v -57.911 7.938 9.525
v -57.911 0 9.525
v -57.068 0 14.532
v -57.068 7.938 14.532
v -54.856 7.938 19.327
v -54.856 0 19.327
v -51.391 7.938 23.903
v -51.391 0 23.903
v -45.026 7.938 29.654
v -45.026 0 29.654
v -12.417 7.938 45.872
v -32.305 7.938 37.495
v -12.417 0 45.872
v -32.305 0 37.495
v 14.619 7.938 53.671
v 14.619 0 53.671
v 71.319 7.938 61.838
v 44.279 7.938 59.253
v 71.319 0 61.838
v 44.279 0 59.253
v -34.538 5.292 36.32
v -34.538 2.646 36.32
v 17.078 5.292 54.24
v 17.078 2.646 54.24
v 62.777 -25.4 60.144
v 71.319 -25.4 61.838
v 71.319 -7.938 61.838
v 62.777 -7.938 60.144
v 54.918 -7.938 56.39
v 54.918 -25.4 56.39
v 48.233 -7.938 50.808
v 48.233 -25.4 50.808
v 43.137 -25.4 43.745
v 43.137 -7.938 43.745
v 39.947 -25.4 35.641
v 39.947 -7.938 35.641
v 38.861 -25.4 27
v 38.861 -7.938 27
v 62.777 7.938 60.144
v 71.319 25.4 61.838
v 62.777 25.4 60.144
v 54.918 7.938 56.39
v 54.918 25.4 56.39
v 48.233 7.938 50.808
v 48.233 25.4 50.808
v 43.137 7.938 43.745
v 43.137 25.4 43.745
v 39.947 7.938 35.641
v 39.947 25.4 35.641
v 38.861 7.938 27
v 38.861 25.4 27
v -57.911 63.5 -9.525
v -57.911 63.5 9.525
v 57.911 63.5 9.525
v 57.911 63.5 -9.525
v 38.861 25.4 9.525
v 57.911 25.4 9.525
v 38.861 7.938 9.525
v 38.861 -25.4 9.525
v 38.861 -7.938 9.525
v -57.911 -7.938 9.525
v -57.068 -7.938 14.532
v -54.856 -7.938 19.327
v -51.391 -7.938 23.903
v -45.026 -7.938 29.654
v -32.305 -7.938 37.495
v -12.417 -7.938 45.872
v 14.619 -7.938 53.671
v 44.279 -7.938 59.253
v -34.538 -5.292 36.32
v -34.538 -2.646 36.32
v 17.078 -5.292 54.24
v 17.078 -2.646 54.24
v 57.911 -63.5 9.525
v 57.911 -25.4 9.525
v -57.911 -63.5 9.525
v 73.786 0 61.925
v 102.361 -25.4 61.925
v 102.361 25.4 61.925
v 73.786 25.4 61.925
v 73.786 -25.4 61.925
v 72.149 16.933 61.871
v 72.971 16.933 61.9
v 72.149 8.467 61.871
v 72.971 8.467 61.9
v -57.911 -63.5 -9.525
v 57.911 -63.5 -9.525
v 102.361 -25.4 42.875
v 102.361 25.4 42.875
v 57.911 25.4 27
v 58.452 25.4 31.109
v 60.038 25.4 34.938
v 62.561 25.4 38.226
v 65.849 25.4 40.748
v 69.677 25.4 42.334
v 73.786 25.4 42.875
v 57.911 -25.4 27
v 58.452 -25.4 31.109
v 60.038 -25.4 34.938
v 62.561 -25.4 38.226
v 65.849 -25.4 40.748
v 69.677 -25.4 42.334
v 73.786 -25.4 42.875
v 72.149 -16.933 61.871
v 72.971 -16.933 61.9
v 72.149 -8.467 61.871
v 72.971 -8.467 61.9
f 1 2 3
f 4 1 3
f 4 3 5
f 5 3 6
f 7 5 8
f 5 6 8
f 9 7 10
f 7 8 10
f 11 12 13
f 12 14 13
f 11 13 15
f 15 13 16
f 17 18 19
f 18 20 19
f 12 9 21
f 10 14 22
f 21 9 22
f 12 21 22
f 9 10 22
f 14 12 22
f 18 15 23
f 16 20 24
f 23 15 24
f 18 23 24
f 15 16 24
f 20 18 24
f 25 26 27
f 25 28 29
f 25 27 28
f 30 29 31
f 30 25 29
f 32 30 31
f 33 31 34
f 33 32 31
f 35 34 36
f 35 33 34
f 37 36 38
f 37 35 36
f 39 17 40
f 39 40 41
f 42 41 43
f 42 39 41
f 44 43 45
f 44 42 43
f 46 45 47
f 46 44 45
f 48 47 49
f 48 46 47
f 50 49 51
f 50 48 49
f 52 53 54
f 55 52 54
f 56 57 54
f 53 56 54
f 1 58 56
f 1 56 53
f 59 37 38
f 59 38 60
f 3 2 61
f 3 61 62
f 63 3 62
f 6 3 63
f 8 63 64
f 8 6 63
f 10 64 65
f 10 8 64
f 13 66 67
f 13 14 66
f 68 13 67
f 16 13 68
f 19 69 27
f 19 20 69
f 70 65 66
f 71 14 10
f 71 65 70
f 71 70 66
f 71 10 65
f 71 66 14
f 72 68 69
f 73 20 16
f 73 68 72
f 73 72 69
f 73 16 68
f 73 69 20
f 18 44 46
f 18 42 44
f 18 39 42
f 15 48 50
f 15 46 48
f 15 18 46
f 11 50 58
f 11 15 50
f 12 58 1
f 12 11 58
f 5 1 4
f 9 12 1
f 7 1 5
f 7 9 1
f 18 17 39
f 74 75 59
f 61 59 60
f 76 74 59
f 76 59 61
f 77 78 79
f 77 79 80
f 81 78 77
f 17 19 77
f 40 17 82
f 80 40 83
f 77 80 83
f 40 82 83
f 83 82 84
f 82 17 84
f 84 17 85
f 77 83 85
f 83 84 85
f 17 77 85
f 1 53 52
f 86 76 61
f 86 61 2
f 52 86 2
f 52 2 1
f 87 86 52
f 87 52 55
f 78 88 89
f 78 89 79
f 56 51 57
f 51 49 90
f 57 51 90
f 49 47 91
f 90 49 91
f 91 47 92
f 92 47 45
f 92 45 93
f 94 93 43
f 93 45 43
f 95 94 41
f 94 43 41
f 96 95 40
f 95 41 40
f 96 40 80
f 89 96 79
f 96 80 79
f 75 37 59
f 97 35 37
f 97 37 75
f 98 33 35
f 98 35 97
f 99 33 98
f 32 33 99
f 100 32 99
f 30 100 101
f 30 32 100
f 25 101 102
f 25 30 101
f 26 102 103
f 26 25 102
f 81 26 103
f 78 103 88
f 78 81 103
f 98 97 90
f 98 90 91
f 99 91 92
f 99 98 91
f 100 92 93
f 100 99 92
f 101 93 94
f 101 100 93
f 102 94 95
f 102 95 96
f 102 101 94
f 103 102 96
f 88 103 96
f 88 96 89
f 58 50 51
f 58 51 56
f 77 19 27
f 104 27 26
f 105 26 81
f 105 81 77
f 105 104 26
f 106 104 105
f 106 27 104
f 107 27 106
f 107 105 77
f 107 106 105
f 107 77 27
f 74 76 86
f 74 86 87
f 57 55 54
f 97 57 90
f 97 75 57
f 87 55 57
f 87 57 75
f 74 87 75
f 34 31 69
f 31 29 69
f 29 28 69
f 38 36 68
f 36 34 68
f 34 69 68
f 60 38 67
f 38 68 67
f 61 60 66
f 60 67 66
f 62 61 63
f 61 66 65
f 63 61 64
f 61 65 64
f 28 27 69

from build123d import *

# Parameters (mm, degrees)
F1_DEPTH = 63.5
F0_W     = 25.4
F0_H     = 19.05
F2_DEPTH = 25.4
F3_DEPTH = 7.9375


# Not quite as in the source:
# - the program builds the solid bodies; features that only make, move or delete a surface that nothing else refers to are left out


with BuildPart() as f1:
    # F0 (on Front) → F1 (new body, symmetric)
    with BuildSketch(Plane.XZ):
        Polygon((38.861105454, 9.525), (-57.911105454, 9.525), (-57.911105454, -9.525), (57.911105454, -9.525), (57.911105454, 9.525), align=None)
    extrude(amount=F1_DEPTH, both=True)

    # F0 (on Front) → F2 (join, symmetric)
    with BuildSketch(Plane.XZ):
        with BuildLine():
            Line((38.861105454, 27.0002), (38.861105454, 9.525))
            Line((38.861105454, 9.525), (57.911105454, 9.525))
            Line((57.911105454, 9.525), (57.911105454, 27.0002))
            ThreePointArc((57.911105454, 27.0002), (62.5607853026, 38.2255201513), (73.786105454, 42.8752))
            Line((73.786105454, 42.8752), (76.961105454, 42.8752))
            Line((76.961105454, 42.8752), (76.961105454, 61.9252))
            Line((76.961105454, 61.9252), (73.786105454, 61.9252))
            add(Edge.make_bspline(
                [(71.3194409243, 61.8379839579), (72.1527081081, 61.872613516), (72.9751435191, 61.9016976168), (73.786105454, 61.9252)],
                knots=[139.2706883943, 139.2706883943, 139.2706883943, 139.2706883943, 141.7389724845, 141.7389724845, 141.7389724845, 141.7389724845], degree=3))
            ThreePointArc((71.3194409243, 61.8379839579), (48.2331811233, 50.8078391763), (38.861105454, 27.0002))
        make_face()
        with Locations((89.661105454, 52.4002)):
            Rectangle(F0_W, F0_H)
    extrude(amount=F2_DEPTH, both=True)

    # F0 (on Front) → F3 (join, symmetric)
    with BuildSketch(Plane.XZ):
        with BuildLine():
            add(Edge.make_bspline(
                [(-57.911105454, 9.525), (-57.1981257704, 40.2751503058), (24.3030967511, 59.8840425909), (71.3194409243, 61.8379839579)],
                knots=[0, 0, 0, 0, 139.2706883943, 139.2706883943, 139.2706883943, 139.2706883943], degree=3))
            Line((-57.911105454, 9.525), (38.861105454, 9.525))
            Line((38.861105454, 9.525), (38.861105454, 27.0002))
            ThreePointArc((38.861105454, 27.0002), (48.2331811233, 50.8078391763), (71.3194409243, 61.8379839579))
        make_face()
    extrude(amount=F3_DEPTH, both=True)


solid = f1.part
